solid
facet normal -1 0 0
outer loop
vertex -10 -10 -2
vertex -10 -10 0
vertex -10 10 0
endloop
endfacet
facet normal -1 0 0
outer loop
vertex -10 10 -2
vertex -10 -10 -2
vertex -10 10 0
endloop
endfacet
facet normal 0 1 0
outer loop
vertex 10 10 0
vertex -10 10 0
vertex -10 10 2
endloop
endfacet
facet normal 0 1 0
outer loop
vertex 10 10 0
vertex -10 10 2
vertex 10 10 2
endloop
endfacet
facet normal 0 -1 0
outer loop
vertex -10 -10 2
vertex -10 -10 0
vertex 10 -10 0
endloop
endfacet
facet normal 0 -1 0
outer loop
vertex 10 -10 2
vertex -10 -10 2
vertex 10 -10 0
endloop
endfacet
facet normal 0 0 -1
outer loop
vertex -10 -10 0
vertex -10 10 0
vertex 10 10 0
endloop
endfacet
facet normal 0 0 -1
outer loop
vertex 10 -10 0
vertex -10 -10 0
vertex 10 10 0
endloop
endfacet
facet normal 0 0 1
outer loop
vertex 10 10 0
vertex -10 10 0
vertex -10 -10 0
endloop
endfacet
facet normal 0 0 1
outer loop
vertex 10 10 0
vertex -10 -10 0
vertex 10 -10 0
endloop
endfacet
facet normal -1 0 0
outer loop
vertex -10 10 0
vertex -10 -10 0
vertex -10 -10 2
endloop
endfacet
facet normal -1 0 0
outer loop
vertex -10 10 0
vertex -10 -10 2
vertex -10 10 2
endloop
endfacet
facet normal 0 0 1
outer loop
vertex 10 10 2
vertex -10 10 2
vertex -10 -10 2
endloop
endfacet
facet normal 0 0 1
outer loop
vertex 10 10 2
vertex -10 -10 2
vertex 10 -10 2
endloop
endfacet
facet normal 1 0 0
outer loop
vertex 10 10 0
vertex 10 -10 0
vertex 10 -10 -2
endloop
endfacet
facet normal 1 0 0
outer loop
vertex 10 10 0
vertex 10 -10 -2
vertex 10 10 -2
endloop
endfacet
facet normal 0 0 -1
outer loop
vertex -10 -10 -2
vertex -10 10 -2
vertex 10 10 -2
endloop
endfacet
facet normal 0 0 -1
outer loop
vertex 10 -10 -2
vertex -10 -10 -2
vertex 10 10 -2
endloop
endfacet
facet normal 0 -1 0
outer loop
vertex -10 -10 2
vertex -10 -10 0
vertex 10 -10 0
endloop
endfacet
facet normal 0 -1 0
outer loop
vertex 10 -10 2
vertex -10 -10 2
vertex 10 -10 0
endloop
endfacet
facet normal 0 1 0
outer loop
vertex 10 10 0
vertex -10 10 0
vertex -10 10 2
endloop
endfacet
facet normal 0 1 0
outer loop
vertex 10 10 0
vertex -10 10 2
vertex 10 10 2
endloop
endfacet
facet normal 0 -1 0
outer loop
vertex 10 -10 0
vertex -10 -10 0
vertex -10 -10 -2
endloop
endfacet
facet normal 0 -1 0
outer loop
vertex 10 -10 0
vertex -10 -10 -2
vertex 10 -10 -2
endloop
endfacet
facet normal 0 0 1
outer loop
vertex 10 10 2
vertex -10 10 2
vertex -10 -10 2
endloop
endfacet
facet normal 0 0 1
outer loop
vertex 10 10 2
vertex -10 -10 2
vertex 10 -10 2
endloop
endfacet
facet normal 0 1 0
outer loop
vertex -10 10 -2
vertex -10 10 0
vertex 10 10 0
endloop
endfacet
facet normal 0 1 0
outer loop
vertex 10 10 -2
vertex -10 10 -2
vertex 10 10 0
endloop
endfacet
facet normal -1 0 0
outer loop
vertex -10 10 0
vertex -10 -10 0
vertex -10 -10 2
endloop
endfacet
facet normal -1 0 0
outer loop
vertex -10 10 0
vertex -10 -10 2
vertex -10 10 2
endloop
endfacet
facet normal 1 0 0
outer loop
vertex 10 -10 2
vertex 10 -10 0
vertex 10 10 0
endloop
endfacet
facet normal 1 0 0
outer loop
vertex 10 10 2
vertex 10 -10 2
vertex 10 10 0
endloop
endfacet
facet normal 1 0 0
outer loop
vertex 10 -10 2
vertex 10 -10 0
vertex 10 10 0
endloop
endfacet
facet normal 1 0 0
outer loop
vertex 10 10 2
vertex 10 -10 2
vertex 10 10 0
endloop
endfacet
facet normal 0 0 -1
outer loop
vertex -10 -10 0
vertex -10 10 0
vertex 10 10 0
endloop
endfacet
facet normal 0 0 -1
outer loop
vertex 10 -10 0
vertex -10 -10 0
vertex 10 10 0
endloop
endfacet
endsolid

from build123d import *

# Parameters (mm, degrees)
F0_W     = 20
F0_H     = 20
F1_DEPTH = 2
F2_W     = 20
F2_H     = 20
F3_DEPTH = 2
F4_DEPTH = 2


with BuildPart() as f1:
    # F0 (on Top) → F1 (new body)
    with BuildSketch(Plane.XY):
        Rectangle(F0_W, F0_H)
    extrude(amount=F1_DEPTH)


with BuildPart() as f3:
    # F2 (on Top) → F3 (new body)
    with BuildSketch(Plane.XY):
        Rectangle(F2_W, F2_H)
    extrude(amount=-F3_DEPTH)


with BuildPart() as f4:
    # F2 (on Top) → F4 (new body)
    with BuildSketch(Plane.XY):
        Rectangle(F2_W, F2_H)
    extrude(amount=F4_DEPTH)


solid = Compound([f1.part, f3.part, f4.part])
